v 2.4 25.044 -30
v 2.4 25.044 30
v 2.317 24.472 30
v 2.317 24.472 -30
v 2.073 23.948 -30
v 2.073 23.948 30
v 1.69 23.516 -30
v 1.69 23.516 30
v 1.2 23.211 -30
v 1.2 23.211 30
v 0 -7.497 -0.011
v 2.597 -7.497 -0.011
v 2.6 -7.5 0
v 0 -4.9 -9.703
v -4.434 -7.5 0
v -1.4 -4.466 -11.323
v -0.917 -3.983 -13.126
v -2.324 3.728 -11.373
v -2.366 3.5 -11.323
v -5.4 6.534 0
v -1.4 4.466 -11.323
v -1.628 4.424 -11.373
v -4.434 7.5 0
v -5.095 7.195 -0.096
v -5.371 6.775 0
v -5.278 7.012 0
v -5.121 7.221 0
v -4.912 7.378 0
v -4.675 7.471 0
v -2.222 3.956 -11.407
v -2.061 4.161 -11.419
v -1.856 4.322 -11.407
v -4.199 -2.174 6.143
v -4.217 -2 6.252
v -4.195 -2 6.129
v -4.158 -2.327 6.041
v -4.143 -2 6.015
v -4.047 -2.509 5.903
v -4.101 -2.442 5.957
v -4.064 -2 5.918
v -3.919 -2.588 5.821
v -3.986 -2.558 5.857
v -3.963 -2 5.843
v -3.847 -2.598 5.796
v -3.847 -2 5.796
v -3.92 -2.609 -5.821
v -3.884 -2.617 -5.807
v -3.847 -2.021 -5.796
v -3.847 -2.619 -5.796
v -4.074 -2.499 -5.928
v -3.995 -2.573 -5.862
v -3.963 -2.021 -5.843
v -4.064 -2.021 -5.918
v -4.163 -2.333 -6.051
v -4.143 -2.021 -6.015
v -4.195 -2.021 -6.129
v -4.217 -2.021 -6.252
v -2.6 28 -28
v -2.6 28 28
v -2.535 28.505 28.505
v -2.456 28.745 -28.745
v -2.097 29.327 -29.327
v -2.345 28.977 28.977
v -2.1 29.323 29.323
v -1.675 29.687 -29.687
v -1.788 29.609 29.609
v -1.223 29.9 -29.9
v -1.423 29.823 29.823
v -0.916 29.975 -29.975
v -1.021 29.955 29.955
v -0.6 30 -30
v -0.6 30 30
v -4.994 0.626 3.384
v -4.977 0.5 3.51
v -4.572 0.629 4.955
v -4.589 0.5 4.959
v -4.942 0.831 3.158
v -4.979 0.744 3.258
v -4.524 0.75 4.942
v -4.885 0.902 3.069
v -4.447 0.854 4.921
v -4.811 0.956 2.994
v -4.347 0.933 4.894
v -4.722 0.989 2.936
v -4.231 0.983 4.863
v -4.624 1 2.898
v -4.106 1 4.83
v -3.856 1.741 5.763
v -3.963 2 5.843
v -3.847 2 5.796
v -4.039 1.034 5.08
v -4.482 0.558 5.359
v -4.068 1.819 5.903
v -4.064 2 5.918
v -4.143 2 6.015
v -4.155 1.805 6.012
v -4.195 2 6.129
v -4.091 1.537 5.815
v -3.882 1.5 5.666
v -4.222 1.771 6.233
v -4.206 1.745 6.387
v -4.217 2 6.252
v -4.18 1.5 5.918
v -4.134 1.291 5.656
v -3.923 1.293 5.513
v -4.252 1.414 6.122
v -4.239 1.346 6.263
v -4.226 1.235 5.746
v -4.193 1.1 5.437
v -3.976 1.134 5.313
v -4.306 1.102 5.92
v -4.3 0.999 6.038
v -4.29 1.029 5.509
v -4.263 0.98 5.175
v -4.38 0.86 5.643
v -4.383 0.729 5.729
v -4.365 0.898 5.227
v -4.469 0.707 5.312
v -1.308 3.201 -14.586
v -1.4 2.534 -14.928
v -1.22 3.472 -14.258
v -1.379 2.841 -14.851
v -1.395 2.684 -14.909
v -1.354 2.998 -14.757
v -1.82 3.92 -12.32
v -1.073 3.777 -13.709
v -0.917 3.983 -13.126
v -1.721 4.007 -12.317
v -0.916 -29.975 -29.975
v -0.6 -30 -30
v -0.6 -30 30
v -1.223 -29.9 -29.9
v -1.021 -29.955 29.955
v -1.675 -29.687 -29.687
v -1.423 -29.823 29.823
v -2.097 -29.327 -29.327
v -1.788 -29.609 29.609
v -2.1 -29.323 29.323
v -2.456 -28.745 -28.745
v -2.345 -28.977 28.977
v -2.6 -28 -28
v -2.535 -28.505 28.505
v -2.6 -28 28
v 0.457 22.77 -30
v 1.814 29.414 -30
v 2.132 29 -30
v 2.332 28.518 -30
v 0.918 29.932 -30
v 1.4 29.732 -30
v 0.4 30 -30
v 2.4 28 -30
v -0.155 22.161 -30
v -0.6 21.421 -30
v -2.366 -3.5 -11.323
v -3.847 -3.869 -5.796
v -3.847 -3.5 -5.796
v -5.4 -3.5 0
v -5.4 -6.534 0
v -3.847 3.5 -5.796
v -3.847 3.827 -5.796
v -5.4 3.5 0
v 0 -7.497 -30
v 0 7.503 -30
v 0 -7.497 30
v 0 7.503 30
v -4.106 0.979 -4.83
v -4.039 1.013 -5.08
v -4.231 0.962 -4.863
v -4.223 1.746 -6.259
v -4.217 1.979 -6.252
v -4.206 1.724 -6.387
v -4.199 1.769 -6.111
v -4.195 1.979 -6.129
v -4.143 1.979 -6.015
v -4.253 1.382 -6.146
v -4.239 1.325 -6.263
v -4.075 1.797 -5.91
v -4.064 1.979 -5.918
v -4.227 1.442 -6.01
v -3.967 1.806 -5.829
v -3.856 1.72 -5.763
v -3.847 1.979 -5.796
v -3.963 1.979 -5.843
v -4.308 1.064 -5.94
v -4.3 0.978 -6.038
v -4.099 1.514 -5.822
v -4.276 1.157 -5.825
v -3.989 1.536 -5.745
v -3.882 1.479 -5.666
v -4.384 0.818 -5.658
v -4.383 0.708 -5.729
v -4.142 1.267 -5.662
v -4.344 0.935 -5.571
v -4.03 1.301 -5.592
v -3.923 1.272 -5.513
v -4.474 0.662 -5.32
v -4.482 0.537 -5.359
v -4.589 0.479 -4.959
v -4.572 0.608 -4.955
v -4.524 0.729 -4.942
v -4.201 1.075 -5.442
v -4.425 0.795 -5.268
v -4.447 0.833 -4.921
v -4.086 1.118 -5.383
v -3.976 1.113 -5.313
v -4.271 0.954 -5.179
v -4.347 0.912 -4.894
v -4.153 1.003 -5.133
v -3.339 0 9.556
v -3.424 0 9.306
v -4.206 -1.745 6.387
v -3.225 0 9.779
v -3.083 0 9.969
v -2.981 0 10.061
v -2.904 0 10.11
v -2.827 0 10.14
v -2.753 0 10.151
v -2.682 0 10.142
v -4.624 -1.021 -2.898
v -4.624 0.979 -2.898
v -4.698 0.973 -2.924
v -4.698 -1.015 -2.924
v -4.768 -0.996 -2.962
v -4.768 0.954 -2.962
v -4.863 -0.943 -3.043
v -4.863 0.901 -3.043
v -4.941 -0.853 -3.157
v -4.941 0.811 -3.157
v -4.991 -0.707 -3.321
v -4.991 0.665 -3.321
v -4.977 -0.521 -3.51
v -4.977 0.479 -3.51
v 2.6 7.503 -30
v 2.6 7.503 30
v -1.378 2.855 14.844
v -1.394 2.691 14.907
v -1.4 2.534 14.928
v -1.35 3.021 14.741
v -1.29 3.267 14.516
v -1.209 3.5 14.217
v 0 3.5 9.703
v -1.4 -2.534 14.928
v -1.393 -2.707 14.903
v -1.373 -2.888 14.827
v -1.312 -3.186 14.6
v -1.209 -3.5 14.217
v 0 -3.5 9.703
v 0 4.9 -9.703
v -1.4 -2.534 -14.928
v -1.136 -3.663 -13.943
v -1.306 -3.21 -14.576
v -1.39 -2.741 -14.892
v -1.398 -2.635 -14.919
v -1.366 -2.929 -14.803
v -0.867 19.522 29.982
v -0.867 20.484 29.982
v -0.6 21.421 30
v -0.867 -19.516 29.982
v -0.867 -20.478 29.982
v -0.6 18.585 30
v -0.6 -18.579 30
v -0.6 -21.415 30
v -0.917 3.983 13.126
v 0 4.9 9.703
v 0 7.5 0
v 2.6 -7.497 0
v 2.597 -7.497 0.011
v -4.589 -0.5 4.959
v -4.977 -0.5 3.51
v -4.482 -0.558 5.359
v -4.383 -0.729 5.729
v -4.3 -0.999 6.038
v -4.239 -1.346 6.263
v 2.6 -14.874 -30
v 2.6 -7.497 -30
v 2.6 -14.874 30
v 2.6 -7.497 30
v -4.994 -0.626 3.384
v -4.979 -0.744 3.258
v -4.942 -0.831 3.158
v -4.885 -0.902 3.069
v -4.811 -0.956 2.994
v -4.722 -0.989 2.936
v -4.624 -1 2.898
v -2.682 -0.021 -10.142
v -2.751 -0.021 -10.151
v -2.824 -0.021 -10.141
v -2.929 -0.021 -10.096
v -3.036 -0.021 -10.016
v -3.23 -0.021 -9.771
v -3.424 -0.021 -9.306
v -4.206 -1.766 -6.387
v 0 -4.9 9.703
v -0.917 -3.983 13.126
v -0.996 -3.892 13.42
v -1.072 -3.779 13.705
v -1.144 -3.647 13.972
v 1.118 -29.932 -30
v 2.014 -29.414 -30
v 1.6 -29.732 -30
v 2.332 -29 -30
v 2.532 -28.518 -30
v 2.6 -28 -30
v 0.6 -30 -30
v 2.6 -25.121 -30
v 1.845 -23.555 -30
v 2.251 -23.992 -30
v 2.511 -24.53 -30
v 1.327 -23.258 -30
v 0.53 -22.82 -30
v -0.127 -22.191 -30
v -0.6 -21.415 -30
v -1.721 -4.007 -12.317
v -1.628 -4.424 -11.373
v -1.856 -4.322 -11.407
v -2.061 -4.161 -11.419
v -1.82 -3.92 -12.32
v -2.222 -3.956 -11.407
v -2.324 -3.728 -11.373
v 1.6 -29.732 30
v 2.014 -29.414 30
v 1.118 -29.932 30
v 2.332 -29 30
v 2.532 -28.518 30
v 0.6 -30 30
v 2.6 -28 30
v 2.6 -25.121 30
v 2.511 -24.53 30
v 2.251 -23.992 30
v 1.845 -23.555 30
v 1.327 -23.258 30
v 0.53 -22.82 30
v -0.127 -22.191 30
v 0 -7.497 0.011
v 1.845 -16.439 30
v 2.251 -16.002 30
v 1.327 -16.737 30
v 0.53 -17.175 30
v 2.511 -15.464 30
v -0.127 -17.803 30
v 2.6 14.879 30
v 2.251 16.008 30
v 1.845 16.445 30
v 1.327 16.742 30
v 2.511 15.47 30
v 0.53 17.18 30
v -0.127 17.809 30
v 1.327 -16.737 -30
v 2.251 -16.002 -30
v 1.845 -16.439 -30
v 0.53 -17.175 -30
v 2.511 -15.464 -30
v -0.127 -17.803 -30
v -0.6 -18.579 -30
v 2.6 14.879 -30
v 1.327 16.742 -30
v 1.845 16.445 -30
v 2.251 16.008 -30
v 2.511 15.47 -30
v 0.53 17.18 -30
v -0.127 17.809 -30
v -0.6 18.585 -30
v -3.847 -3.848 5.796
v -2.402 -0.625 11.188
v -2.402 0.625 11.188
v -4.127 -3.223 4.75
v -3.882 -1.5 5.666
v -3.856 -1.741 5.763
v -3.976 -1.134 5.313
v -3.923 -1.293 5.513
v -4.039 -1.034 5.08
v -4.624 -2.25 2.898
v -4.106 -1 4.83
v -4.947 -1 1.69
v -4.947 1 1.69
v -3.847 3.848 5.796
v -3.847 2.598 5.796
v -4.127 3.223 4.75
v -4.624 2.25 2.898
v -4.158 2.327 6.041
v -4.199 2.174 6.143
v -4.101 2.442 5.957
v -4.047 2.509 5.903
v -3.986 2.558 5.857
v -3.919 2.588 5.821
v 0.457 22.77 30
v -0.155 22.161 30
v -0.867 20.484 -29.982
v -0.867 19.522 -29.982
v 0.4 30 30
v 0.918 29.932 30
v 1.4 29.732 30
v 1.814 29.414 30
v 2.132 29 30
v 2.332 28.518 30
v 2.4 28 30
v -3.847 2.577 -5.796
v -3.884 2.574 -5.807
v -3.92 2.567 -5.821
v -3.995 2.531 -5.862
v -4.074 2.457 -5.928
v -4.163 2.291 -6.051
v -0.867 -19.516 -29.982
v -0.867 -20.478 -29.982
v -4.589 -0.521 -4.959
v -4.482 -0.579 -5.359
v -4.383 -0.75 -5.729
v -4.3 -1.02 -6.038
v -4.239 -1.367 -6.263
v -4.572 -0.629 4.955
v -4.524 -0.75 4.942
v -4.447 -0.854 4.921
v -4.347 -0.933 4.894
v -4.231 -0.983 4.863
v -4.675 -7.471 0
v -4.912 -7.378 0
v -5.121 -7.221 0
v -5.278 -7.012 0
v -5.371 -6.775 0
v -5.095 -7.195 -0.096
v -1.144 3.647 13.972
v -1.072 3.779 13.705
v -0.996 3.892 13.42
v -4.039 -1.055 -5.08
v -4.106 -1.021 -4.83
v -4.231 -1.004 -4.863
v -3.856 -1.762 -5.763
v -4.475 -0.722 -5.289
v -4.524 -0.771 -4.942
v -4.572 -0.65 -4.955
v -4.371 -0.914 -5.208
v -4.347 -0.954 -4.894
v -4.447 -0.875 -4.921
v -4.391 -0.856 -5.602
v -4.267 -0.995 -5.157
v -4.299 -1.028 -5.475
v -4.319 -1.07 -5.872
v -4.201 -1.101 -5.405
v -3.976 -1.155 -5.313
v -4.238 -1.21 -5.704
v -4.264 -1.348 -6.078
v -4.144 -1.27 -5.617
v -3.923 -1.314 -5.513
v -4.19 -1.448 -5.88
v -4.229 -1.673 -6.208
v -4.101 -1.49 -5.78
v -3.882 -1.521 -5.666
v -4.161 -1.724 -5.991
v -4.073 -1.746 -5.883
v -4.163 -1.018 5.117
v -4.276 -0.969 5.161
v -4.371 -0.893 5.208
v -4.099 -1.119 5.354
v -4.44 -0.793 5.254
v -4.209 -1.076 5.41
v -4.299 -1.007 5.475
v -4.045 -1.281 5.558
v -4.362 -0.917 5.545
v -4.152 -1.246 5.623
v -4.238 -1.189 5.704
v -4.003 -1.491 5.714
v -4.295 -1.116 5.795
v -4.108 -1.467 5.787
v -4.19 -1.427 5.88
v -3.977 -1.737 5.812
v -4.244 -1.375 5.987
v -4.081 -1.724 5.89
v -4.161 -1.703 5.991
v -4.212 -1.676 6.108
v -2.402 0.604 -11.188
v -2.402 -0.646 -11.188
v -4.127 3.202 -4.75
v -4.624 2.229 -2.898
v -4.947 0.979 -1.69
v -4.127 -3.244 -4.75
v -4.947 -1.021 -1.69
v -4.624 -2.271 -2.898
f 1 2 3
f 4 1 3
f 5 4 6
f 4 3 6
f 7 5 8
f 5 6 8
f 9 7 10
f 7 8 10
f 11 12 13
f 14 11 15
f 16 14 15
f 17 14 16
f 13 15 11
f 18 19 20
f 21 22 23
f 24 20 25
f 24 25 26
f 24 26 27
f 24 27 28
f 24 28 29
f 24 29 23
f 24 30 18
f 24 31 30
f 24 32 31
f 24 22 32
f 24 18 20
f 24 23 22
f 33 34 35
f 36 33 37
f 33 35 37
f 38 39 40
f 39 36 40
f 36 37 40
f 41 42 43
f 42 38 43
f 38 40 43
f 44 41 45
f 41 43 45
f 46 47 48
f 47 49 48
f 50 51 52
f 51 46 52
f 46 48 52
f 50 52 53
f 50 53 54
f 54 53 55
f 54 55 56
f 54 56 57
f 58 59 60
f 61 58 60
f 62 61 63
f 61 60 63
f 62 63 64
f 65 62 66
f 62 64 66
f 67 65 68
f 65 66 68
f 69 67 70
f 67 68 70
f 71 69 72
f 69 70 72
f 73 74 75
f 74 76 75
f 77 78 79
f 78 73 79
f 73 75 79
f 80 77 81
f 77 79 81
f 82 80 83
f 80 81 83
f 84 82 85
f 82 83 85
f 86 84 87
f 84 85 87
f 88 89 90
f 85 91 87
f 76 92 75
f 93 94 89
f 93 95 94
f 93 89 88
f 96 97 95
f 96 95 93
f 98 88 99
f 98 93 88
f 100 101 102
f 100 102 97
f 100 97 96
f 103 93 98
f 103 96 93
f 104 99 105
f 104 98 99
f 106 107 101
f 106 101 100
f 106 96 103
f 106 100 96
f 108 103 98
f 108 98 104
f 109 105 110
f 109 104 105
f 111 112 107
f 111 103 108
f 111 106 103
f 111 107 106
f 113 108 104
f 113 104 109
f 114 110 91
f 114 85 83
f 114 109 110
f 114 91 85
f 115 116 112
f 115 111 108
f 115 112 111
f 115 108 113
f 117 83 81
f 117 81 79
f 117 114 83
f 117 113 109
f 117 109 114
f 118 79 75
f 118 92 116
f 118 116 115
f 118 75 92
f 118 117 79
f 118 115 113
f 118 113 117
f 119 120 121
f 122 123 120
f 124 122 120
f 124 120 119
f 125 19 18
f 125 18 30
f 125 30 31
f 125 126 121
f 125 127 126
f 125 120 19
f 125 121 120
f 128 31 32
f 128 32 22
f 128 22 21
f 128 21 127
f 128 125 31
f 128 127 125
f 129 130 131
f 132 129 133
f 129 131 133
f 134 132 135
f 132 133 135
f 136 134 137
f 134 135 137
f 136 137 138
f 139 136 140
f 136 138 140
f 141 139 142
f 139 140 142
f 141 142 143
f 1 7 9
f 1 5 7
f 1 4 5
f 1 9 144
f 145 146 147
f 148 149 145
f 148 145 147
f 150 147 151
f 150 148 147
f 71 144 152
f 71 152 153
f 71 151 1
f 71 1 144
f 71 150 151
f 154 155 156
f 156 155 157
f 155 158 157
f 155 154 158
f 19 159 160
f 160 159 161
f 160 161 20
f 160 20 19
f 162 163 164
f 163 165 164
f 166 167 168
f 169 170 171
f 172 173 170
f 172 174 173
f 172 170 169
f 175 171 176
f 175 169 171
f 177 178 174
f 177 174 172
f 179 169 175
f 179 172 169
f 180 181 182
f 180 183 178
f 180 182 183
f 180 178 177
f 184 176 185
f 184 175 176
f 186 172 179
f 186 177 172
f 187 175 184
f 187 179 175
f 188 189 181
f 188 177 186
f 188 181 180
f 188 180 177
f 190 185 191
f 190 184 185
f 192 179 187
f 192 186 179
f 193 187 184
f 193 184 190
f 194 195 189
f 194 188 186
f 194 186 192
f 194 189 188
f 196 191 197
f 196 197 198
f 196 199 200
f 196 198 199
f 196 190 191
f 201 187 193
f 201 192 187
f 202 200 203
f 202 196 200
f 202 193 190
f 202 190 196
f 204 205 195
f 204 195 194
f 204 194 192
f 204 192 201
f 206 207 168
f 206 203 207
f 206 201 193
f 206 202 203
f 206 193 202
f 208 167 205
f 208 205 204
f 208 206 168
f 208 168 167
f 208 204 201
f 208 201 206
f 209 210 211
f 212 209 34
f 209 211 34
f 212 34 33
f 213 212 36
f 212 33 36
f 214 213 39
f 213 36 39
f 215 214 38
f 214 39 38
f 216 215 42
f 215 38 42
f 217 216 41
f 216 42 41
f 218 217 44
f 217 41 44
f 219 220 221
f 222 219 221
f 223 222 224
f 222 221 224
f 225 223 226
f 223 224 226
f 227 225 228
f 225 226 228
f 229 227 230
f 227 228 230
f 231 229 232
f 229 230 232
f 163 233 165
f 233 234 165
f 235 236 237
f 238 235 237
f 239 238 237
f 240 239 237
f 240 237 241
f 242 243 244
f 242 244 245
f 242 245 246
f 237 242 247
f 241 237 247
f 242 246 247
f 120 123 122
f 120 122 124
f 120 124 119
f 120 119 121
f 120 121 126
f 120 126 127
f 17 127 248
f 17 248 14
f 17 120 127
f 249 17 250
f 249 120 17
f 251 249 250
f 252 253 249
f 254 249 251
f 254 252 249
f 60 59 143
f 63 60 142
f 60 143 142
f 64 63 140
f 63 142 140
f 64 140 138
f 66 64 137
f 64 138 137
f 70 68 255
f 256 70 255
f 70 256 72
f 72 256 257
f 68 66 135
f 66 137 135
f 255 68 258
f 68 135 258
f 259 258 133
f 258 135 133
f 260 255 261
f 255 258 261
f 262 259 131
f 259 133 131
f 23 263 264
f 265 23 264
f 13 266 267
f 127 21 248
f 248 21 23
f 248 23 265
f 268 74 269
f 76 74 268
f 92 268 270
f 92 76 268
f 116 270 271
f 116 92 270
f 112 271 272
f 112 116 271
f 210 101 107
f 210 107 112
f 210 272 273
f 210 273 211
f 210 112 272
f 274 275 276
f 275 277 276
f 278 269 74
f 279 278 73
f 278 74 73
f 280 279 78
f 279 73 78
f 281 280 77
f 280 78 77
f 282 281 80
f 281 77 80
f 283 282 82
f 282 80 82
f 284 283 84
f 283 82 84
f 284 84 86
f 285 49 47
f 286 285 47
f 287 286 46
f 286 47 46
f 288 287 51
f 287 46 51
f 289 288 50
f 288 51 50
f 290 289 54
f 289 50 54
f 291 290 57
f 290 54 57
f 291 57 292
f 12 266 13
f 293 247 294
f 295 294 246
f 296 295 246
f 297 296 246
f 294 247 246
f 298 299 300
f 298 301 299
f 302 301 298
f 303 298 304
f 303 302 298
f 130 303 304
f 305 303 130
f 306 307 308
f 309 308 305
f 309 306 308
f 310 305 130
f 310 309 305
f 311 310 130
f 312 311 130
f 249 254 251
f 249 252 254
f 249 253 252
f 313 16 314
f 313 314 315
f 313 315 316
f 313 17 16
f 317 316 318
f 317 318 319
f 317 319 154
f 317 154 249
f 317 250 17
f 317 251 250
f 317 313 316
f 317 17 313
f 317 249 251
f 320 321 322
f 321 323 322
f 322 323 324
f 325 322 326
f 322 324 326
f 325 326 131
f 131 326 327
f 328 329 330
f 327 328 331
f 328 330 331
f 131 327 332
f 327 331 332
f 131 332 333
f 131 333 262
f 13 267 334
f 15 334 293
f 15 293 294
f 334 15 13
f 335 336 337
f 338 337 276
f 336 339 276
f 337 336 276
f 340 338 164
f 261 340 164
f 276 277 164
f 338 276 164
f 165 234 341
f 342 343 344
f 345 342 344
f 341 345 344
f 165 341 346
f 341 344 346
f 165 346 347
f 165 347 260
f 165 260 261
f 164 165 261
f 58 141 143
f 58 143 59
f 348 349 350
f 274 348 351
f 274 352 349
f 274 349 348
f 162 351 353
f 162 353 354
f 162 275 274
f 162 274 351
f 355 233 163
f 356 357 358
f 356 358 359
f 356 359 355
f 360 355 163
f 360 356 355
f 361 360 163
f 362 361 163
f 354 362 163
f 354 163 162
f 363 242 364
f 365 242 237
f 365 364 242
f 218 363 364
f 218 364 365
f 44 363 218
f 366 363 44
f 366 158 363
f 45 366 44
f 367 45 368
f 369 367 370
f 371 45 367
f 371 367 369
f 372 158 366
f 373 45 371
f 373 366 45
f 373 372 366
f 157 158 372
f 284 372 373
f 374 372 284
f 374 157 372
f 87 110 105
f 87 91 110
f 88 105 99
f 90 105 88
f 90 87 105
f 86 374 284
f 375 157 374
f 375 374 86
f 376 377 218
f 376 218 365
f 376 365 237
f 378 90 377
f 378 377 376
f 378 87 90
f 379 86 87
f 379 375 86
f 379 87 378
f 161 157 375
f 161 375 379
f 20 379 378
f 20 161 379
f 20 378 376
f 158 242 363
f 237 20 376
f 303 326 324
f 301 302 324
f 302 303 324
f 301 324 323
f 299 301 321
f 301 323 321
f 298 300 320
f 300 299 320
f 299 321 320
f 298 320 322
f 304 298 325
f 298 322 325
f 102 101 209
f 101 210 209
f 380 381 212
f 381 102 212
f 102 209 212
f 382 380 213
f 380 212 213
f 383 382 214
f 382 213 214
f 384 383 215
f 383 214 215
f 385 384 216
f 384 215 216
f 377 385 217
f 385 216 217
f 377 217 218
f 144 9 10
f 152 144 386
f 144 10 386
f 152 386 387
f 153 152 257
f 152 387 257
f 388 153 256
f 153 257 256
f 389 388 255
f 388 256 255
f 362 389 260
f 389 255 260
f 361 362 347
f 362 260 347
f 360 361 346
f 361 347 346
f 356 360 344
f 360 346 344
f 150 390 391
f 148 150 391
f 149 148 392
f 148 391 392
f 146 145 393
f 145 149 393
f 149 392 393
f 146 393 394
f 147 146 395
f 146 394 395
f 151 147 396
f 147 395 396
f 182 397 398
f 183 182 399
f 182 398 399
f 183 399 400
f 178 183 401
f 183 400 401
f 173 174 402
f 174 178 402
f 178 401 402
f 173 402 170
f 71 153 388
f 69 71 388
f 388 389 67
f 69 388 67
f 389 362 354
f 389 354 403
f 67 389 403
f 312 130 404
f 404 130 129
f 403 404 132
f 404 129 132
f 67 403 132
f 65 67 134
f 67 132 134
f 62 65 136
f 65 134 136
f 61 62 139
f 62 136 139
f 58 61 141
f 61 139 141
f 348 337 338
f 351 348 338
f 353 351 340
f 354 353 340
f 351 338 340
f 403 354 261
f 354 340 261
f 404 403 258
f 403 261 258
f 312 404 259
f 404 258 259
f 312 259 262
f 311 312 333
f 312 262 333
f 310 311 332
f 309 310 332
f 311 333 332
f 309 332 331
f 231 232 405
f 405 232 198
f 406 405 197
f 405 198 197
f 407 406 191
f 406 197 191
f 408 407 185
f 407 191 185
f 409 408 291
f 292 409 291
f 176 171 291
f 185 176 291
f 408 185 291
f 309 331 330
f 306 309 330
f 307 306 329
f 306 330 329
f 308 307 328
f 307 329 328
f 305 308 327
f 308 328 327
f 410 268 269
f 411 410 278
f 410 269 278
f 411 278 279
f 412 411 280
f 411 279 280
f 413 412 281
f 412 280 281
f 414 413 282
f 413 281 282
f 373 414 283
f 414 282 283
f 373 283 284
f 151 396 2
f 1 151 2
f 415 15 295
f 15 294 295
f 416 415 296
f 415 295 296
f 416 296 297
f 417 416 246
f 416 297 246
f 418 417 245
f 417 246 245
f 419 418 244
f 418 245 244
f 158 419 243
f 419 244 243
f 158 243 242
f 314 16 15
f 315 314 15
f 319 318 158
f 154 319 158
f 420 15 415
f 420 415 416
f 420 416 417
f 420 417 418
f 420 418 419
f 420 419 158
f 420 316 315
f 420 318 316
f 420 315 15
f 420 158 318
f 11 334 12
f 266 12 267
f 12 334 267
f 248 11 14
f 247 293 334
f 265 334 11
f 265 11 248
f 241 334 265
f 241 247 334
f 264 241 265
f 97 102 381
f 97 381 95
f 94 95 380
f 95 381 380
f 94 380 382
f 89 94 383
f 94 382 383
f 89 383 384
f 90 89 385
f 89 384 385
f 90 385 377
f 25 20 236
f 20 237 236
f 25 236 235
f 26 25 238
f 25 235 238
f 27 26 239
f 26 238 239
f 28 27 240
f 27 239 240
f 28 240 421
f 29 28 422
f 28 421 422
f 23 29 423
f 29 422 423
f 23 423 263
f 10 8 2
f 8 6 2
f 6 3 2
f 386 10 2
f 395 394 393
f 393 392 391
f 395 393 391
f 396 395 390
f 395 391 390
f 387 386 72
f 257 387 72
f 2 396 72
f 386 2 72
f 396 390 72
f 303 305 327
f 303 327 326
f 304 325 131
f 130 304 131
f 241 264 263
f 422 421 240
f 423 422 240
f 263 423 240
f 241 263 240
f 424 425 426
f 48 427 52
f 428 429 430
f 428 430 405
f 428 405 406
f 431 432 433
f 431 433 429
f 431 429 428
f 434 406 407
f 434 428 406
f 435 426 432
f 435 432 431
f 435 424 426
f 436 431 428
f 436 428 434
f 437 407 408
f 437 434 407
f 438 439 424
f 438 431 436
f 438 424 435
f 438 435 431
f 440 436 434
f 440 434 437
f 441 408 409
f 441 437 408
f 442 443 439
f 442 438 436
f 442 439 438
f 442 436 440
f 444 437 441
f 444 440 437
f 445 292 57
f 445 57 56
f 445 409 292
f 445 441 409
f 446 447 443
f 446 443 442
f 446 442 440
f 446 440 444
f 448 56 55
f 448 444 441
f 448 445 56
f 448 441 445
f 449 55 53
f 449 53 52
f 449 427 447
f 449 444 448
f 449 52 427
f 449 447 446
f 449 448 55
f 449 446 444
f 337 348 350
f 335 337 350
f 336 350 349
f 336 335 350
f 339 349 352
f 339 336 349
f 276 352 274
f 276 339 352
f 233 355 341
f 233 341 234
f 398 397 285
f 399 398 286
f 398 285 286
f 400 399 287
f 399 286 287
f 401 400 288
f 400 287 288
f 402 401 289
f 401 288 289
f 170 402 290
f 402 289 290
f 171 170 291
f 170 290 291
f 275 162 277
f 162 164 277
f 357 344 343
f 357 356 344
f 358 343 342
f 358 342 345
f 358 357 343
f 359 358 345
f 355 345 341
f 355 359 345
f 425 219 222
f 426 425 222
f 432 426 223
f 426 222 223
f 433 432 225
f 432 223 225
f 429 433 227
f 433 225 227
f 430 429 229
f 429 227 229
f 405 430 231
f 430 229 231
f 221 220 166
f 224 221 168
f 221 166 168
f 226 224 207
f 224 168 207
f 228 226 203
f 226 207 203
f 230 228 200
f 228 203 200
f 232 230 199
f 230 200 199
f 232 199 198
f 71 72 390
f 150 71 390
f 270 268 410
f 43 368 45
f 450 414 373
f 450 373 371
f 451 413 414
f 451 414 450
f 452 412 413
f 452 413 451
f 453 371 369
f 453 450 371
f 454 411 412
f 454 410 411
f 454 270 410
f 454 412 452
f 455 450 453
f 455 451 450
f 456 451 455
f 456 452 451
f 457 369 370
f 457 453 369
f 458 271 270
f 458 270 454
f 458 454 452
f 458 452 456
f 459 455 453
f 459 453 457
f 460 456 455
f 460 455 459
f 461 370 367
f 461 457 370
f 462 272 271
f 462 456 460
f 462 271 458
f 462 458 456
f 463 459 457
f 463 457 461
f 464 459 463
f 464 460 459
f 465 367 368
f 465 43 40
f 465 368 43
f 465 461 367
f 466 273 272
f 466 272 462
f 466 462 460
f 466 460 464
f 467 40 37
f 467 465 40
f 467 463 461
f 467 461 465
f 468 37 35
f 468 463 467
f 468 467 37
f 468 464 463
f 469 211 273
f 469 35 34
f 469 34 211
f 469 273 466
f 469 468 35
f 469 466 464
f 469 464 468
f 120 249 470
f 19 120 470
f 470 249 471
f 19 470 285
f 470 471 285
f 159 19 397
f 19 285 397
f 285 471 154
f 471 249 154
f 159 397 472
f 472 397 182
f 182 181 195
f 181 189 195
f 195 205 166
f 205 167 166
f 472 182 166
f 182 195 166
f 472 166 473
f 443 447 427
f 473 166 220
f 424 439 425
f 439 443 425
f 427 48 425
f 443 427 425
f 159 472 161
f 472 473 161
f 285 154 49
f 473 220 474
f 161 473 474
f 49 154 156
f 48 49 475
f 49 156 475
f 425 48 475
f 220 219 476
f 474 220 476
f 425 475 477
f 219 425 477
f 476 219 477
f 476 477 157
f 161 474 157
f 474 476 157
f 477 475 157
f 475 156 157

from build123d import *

# Parameters (mm, degrees)
SALIENTE_EXTRUIR1_DEPTH       = 30
REDONDEO1_R                   = 2
SALIENTE_EXTRUIR2_START       = -3.5
SALIENTE_EXTRUIR2_DEPTH       = 7
SALIENTE_EXTRUIR2_START_2     = -15.187316551
SALIENTE_EXTRUIR2_2_DEPTH     = 29.673057242
SALIENTE_EXTRUIR2_START_3     = -18
SALIENTE_EXTRUIR2_3_OUTLINE_W = 26
SALIENTE_EXTRUIR2_3_OUTLINE_H = 32
SALIENTE_EXTRUIR2_3_DEPTH     = 33.799218947
SALIENTE_EXTRUIR4_DEPTH       = 0.5
REDONDEO6_R                   = 0.5
SALIENTE_EXTRUIR5_DEPTH       = 0.5
REDONDEO7_R                   = 0.5
REDONDEO8_R                   = 1
REDONDEO9_R                   = 2
CROQUIS6_W                    = 2.6
CROQUIS6_H                    = 15
CORTAR_EXTRUIR1_DEPTH         = 68.29903431


with BuildPart() as part:
    # Croquis1 → Saliente-Extruir1 (new, symmetric)
    with BuildSketch(Plane.XY):
        with BuildLine():
            Line((2.6, -23.497140521), (2.6, -30))
            Line((2.6, -30), (-2.6, -30))
            Line((-2.6, -30), (-2.6, 30))
            Line((-2.6, 30), (2.4, 30))
            Line((2.4, 30), (2.4, 23.497140521))
            ThreePointArc((2.4, 23.497140521), (-0.898569968, 19.902818604), (2.6, 16.502859479))
            Line((2.6, 16.502859479), (2.6, 7.502859479))
            Line((2.6, 7.502859479), (0, 7.502859479))
            Line((0, 7.502859479), (0, -7.497140521))
            Line((0, -7.497140521), (2.6, -7.497140521))
            Line((2.6, -7.497140521), (2.6, -16.497140521))
            ThreePointArc((2.6, -16.497140521), (-0.9, -19.997140521), (2.6, -23.497140521))
        make_face()
    extrude(amount=SALIENTE_EXTRUIR1_DEPTH, both=True)

    # Redondeo1
    # the kernel refuses this fillet: 2 mm, written as the material it takes off along each edge
    with BuildSketch(Plane(origin=(-2.6, -35, 30), x_dir=(1, 0, 0), z_dir=(0, 1, 0)), Plane(origin=(-2.6, -35, -30), x_dir=(0, 0, 1), z_dir=(0, 1, 0)), Plane(origin=(2.4, 30, 35), x_dir=(0, -1, 0), z_dir=(0, 0, -1)), Plane(origin=(-2.6, 30, 35), x_dir=(1, 0, 0), z_dir=(0, 0, -1)), Plane(origin=(-2.6, -30, 35), x_dir=(0, 1, 0), z_dir=(0, 0, -1)), Plane(origin=(2.6, -30, 35), x_dir=(-1, 0, 0), z_dir=(0, 0, -1))) as redondeo1_piece_1:
        with BuildLine():
            CenterArc((REDONDEO1_R, REDONDEO1_R), REDONDEO1_R, 180, 90)
            Line((0, REDONDEO1_R), (0, 0))
            Line((0, 0), (REDONDEO1_R, 0))
        make_face()
    extrude(amount=70, mode=Mode.SUBTRACT)
    with BuildSketch(Plane(origin=(2.6, -23.497140521, 34.058688457), x_dir=(0, -1, 0), z_dir=(0, 0, -1))) as redondeo1_piece_2:
        with BuildLine():
            CenterArc((1.623475383, 2), REDONDEO1_R, 201.323686263, 68.676313737)
            ThreePointArc((-0.239606574, 1.272727273), (-0.06042321, 0.647542667), (0, 0))
            Line((0, 0), (1.623475383, 0))
        make_face()
    extrude(amount=68.117376915, mode=Mode.SUBTRACT)
    with BuildSketch(Plane(origin=(2.4, 23.497140521, 33.866380556), x_dir=(-0.9726665465042704, -0.23220635071301512, 0), z_dir=(0, 0, -1))) as redondeo1_piece_3:
        with BuildLine():
            CenterArc((1.586213845, 1.968692311), REDONDEO1_R, 193.427003719, 66.421821522)
            Line((-0.359119248, 1.504279609), (0, 0))
            ThreePointArc((0, 0), (0.61686094, 0.054788456), (1.23372188, 0))
        make_face()
    extrude(amount=67.732761113, mode=Mode.SUBTRACT)

    # Redondeo9
    redondeo9_edges = [part.edges().sort_by_distance(p)[0] for p in [
        (2.6, -16.497140521, 0),
        (2.6, 16.502859479, 0),
    ]]
    fillet(redondeo9_edges, radius=REDONDEO9_R)


with BuildPart() as body_2:
    # Saliente-Extruir2: read off the stored shape, not the designer's step
    # Saliente-Extruir2 outline → Saliente-Extruir2 (new body)
    with BuildSketch(Plane(origin=(0, 0, 0), x_dir=(1, 0, 0), z_dir=(0, 1, 0)).offset(SALIENTE_EXTRUIR2_START)):
        Polygon((2.6, 0), (-1.4, 14.92820323), (-5.4, 0), (-1.4, -14.92820323), align=None)
    extrude(amount=SALIENTE_EXTRUIR2_DEPTH)

    # Saliente-Extruir2 2 outline → Saliente-Extruir2 2 (add)
    with BuildSketch(Plane(origin=(0, 0, 0), x_dir=(0.9681003458863747, 0.06485042646813632, 0.24202508647159393), z_dir=(0.25056280708573186, -0.25056280708573186, -0.9351131265310292)).offset(SALIENTE_EXTRUIR2_START_2)):
        Polygon((2.030682701, 7.244443697), (-5.714120066, 7.244443697), (-4.741363669, -7.244443697), (3.003439098, -7.244443697), align=None)
    extrude(amount=SALIENTE_EXTRUIR2_2_DEPTH)

    # Saliente-Extruir2 3 outline → Saliente-Extruir2 3 (cut)
    with BuildSketch(Plane(origin=(0, 0, 0), x_dir=(0.9681003458863747, 0.06485042646813632, -0.24202508647159393), z_dir=(0.25056280708573186, -0.25056280708573186, 0.9351131265310292)).offset(SALIENTE_EXTRUIR2_START_3)):
        with Locations((-1, 0)):
            Rectangle(SALIENTE_EXTRUIR2_3_OUTLINE_W, SALIENTE_EXTRUIR2_3_OUTLINE_H)
        Polygon((3.003439098, 7.244443697), (2.030682701, -7.244443697), (-5.714120066, -7.244443697), (-4.741363669, 7.244443697), align=None, mode=Mode.SUBTRACT)
    extrude(amount=SALIENTE_EXTRUIR2_3_DEPTH, mode=Mode.SUBTRACT)

    # Croquis4 → Saliente-Extruir4 (add)
    with BuildSketch(Plane(origin=(0.486941537, 0, -21.970364919), x_dir=(0.25881904510252135, 0, -0.9659258262890682), z_dir=(0.9659258262890681, 0, 0.2588190451025213))):
        with BuildLine():
            Line((-16.745395475, -2.021015706), (-16.745395475, -2.619091917))
            Line((-16.745395475, -2.619091917), (-12.245395475, -0.021015706))
            Line((-12.245395475, -0.021015706), (-16.745395475, 2.577060506))
            Line((-16.745395475, 2.577060506), (-16.745395475, 1.978984294))
            ThreePointArc((-16.745395475, 1.978984294), (-17.038288694, 1.271877513), (-17.745395475, 0.978984294))
            Line((-17.745395475, 0.978984294), (-19.745395475, 0.978984294))
            Line((-19.745395475, 0.978984294), (-19.745395475, -1.021015706))
            Line((-19.745395475, -1.021015706), (-17.745395475, -1.021015706))
            ThreePointArc((-17.745395475, -1.021015706), (-17.038288694, -1.313908925), (-16.745395475, -2.021015706))
        make_face()
    extrude(amount=-SALIENTE_EXTRUIR4_DEPTH)

    # Redondeo6
    # the kernel refuses this fillet: 0.5 mm, written as the material it takes off along each edge
    with BuildSketch(Plane(origin=(-4.588867688, 0.978984294, -4.959038654), x_dir=(0.9659258262890682, 0, 0.2588190451025214), z_dir=(-0.25881904510252135, 0, 0.9659258262890682)), Plane(origin=(-5.430029584, -1.021015706, -1.819779719), x_dir=(0.9659258262890682, 0, 0.2588190451025214), z_dir=(0.25881904510252135, 0, -0.9659258262890682))) as redondeo6_piece_1:
        with BuildLine():
            CenterArc((REDONDEO6_R, -REDONDEO6_R), REDONDEO6_R, 90, 90)
            Line((0, -REDONDEO6_R), (0, 0))
            Line((0, 0), (REDONDEO6_R, 0))
        make_face()
    extrude(amount=3.25, mode=Mode.SUBTRACT)
    with BuildSketch(Plane(origin=(-5.106505778, 2.228984294, -3.027187001), x_dir=(0.9659258262890685, 0, 0.2588190451025201), z_dir=(0, -1, 0))) as redondeo6_piece_2:
        with BuildLine():
            CenterArc((REDONDEO6_R, -REDONDEO6_R), REDONDEO6_R, 90, 90)
            Line((0, -REDONDEO6_R), (0, 0))
            Line((0, 0), (REDONDEO6_R, 0))
        make_face()
    extrude(amount=4.5, mode=Mode.SUBTRACT)
    with BuildSketch(Plane(origin=(-4.588867688, -2.021015706, -4.959038654), x_dir=(0, 1, 0), z_dir=(-0.25881904510252135, -7.32307077246263e-15, 0.9659258262890682))) as redondeo6_piece_3:
        with BuildLine():
            CenterArc((1 + REDONDEO6_R, -REDONDEO6_R), REDONDEO6_R, 90, 90)
            Line((1 + REDONDEO6_R, 0), (1, 0))
            Line((1, 0), (1, -REDONDEO6_R))
        make_face()
    revolve(axis=Axis((-4.588867688, -2.021015706, -4.959038654), (-0.9659258262890682, 0, -0.25881904510252135)), revolution_arc=90, mode=Mode.SUBTRACT)
    with BuildSketch(Plane(origin=(-4.610228478, -3.244091917, -4.879319101), x_dir=(0.9659258262890678, 2.238086743988656e-15, 0.25881904510252257), z_dir=(0.2241438680420138, 0.5000000000000003, -0.8365163037378075)), Plane(origin=(-2.885183105, -0.646015706, -11.317276078), x_dir=(0.9659258262890683, 0, 0.2588190451025209), z_dir=(-0.22414386804201394, 0.49999999999999983, 0.8365163037378079))) as redondeo6_piece_4:
        with BuildLine():
            CenterArc((REDONDEO6_R, -REDONDEO6_R), REDONDEO6_R, 90, 90)
            Line((0, -REDONDEO6_R), (0, 0))
            Line((0, 0), (REDONDEO6_R, 0))
        make_face()
    extrude(amount=7.696152423, mode=Mode.SUBTRACT)
    with BuildSketch(Plane(origin=(-4.588867688, 1.978984294, -4.959038654), x_dir=(0.2588190451025222, 3.108624468950456e-15, -0.9659258262890679), z_dir=(0, 1, 0))) as redondeo6_piece_5:
        with BuildLine():
            CenterArc((1 + REDONDEO6_R, -REDONDEO6_R), REDONDEO6_R, 90, 90)
            Line((1 + REDONDEO6_R, 0), (1, 0))
            Line((1, 0), (1, -REDONDEO6_R))
        make_face()
    revolve(axis=Axis((-4.588867688, 1.978984294, -4.959038654), (-0.9659258262890682, 0, -0.25881904510252135)), revolution_arc=90, mode=Mode.SUBTRACT)
    with BuildSketch(Plane(origin=(-4.330048643, 3.827060506, -5.92496448), x_dir=(0.9659258262890695, 0, 0.2588190451025165), z_dir=(0, -1, 0)), Plane(origin=(-4.330048643, -2.021015706, -5.92496448), x_dir=(0.9659258262890695, 0, 0.2588190451025165), z_dir=(0, -1, 0))) as redondeo6_piece_6:
        with BuildLine():
            CenterArc((REDONDEO6_R, -REDONDEO6_R), REDONDEO6_R, 90, 90)
            Line((0, -REDONDEO6_R), (0, 0))
            Line((0, 0), (REDONDEO6_R, 0))
        make_face()
    extrude(amount=1.848076211, mode=Mode.SUBTRACT)

    # Croquis5 → Saliente-Extruir5 (add)
    with BuildSketch(Plane(origin=(-5.03826859, 0, 1.35), x_dir=(0.25881904510252135, 0, 0.9659258262890682), z_dir=(-0.9659258262890681, 0, 0.2588190451025213))):
        with BuildLine():
            Line((4.602377156, -2), (4.602377156, -2.598076211))
            Line((4.602377156, -2.598076211), (9.102377156, 0))
            Line((9.102377156, 0), (4.602377156, 2.598076211))
            Line((4.602377156, 2.598076211), (4.602377156, 2))
            ThreePointArc((4.602377156, 2), (4.309483938, 1.292893219), (3.602377156, 1))
            Line((3.602377156, 1), (1.602377156, 1))
            Line((1.602377156, 1), (1.602377156, -1))
            Line((1.602377156, -1), (3.602377156, -1))
            ThreePointArc((3.602377156, -1), (4.309483938, -1.292893219), (4.602377156, -2))
        make_face()
    extrude(amount=SALIENTE_EXTRUIR5_DEPTH)

    # Redondeo7
    # the kernel refuses this fillet: 0.5 mm, written as the material it takes off along each edge
    with BuildSketch(Plane(origin=(-4.588867688, 2, 4.959038654), x_dir=(0.2588190451025221, 1.5543122344752223e-15, 0.9659258262890679), z_dir=(0, 1, 0))) as redondeo7_piece_1:
        with BuildLine():
            CenterArc((1 + REDONDEO7_R, REDONDEO7_R), REDONDEO7_R, 180, 90)
            Line((1 + REDONDEO7_R, 0), (1, 0))
            Line((1, 0), (1, REDONDEO7_R))
        make_face()
    revolve(axis=Axis((-4.588867688, 2, 4.959038654), (0.9659258262890682, 0, -0.25881904510252135)), revolution_arc=90, mode=Mode.SUBTRACT)
    with BuildSketch(Plane(origin=(-2.885183105, -0.625, 11.317276078), x_dir=(0.965925826289068, 0, -0.2588190451025217), z_dir=(-0.22414386804201394, 0.49999999999999967, -0.8365163037378079)), Plane(origin=(-4.610228478, -3.223076211, 4.879319101), x_dir=(0.9659258262890681, 0, -0.25881904510252185), z_dir=(0.2241438680420139, 0.4999999999999999, 0.8365163037378078))) as redondeo7_piece_2:
        with BuildLine():
            CenterArc((REDONDEO7_R, REDONDEO7_R), REDONDEO7_R, 180, 90)
            Line((0, REDONDEO7_R), (0, 0))
            Line((0, 0), (REDONDEO7_R, 0))
        make_face()
    extrude(amount=7.696152423, mode=Mode.SUBTRACT)
    with BuildSketch(Plane(origin=(-4.588867688, -2, 4.959038654), x_dir=(0, 1, 0), z_dir=(-0.25881904510252135, 0, -0.9659258262890682))) as redondeo7_piece_3:
        with BuildLine():
            CenterArc((1 + REDONDEO7_R, REDONDEO7_R), REDONDEO7_R, 180, 90)
            Line((1 + REDONDEO7_R, 0), (1, 0))
            Line((1, 0), (1, REDONDEO7_R))
        make_face()
    revolve(axis=Axis((-4.588867688, -2, 4.959038654), (0.9659258262890682, 0, -0.25881904510252135)), revolution_arc=90, mode=Mode.SUBTRACT)
    with BuildSketch(Plane(origin=(-5.430029584, -1, 1.819779719), x_dir=(0.9659258262890682, 0, -0.2588190451025214), z_dir=(0.25881904510252135, 0, 0.9659258262890682)), Plane(origin=(-4.588867688, 1, 4.959038654), x_dir=(0.9659258262890681, 0, -0.2588190451025213), z_dir=(-0.25881904510252135, 0, -0.9659258262890682))) as redondeo7_piece_4:
        with BuildLine():
            CenterArc((REDONDEO7_R, REDONDEO7_R), REDONDEO7_R, 180, 90)
            Line((0, REDONDEO7_R), (0, 0))
            Line((0, 0), (REDONDEO7_R, 0))
        make_face()
    extrude(amount=3.25, mode=Mode.SUBTRACT)
    with BuildSketch(Plane(origin=(-5.106505778, 2.25, 3.027187001), x_dir=(0.9659258262890681, 0, -0.25881904510252174), z_dir=(0, -1, 0))) as redondeo7_piece_5:
        with BuildLine():
            CenterArc((REDONDEO7_R, REDONDEO7_R), REDONDEO7_R, 180, 90)
            Line((0, REDONDEO7_R), (0, 0))
            Line((0, 0), (REDONDEO7_R, 0))
        make_face()
    extrude(amount=4.5, mode=Mode.SUBTRACT)
    with BuildSketch(Plane(origin=(-4.330048643, -2, 5.92496448), x_dir=(0.9659258262890681, 0, -0.25881904510252174), z_dir=(0, -1, 0)), Plane(origin=(-4.330048643, 3.848076211, 5.92496448), x_dir=(0.9659258262890682, 0, -0.2588190451025215), z_dir=(0, -1, 0))) as redondeo7_piece_6:
        with BuildLine():
            CenterArc((REDONDEO7_R, REDONDEO7_R), REDONDEO7_R, 180, 90)
            Line((0, REDONDEO7_R), (0, 0))
            Line((0, 0), (REDONDEO7_R, 0))
        make_face()
    extrude(amount=1.848076211, mode=Mode.SUBTRACT)

    # Redondeo8
    redondeo8_edges = [body_2.edges().sort_by_distance(p)[0] for p in [
        (-3.4, 5.5, -7.464101615),
        (-3.4, 5.5, 7.464101615),
        (-3.4, -5.5, 7.464101615),
        (-3.4, -5.5, -7.464101615),
    ]]
    fillet(redondeo8_edges, radius=REDONDEO8_R)

    # Croquis6 → Cortar-Extruir1 (cut, through all)
    with BuildSketch(Plane.XY.offset(30)):
        with Locations((1.3, 0.002859479)):
            Rectangle(CROQUIS6_W, CROQUIS6_H)
    extrude(amount=-CORTAR_EXTRUIR1_DEPTH, mode=Mode.SUBTRACT)


solid = Compound([part.part, body_2.part])
